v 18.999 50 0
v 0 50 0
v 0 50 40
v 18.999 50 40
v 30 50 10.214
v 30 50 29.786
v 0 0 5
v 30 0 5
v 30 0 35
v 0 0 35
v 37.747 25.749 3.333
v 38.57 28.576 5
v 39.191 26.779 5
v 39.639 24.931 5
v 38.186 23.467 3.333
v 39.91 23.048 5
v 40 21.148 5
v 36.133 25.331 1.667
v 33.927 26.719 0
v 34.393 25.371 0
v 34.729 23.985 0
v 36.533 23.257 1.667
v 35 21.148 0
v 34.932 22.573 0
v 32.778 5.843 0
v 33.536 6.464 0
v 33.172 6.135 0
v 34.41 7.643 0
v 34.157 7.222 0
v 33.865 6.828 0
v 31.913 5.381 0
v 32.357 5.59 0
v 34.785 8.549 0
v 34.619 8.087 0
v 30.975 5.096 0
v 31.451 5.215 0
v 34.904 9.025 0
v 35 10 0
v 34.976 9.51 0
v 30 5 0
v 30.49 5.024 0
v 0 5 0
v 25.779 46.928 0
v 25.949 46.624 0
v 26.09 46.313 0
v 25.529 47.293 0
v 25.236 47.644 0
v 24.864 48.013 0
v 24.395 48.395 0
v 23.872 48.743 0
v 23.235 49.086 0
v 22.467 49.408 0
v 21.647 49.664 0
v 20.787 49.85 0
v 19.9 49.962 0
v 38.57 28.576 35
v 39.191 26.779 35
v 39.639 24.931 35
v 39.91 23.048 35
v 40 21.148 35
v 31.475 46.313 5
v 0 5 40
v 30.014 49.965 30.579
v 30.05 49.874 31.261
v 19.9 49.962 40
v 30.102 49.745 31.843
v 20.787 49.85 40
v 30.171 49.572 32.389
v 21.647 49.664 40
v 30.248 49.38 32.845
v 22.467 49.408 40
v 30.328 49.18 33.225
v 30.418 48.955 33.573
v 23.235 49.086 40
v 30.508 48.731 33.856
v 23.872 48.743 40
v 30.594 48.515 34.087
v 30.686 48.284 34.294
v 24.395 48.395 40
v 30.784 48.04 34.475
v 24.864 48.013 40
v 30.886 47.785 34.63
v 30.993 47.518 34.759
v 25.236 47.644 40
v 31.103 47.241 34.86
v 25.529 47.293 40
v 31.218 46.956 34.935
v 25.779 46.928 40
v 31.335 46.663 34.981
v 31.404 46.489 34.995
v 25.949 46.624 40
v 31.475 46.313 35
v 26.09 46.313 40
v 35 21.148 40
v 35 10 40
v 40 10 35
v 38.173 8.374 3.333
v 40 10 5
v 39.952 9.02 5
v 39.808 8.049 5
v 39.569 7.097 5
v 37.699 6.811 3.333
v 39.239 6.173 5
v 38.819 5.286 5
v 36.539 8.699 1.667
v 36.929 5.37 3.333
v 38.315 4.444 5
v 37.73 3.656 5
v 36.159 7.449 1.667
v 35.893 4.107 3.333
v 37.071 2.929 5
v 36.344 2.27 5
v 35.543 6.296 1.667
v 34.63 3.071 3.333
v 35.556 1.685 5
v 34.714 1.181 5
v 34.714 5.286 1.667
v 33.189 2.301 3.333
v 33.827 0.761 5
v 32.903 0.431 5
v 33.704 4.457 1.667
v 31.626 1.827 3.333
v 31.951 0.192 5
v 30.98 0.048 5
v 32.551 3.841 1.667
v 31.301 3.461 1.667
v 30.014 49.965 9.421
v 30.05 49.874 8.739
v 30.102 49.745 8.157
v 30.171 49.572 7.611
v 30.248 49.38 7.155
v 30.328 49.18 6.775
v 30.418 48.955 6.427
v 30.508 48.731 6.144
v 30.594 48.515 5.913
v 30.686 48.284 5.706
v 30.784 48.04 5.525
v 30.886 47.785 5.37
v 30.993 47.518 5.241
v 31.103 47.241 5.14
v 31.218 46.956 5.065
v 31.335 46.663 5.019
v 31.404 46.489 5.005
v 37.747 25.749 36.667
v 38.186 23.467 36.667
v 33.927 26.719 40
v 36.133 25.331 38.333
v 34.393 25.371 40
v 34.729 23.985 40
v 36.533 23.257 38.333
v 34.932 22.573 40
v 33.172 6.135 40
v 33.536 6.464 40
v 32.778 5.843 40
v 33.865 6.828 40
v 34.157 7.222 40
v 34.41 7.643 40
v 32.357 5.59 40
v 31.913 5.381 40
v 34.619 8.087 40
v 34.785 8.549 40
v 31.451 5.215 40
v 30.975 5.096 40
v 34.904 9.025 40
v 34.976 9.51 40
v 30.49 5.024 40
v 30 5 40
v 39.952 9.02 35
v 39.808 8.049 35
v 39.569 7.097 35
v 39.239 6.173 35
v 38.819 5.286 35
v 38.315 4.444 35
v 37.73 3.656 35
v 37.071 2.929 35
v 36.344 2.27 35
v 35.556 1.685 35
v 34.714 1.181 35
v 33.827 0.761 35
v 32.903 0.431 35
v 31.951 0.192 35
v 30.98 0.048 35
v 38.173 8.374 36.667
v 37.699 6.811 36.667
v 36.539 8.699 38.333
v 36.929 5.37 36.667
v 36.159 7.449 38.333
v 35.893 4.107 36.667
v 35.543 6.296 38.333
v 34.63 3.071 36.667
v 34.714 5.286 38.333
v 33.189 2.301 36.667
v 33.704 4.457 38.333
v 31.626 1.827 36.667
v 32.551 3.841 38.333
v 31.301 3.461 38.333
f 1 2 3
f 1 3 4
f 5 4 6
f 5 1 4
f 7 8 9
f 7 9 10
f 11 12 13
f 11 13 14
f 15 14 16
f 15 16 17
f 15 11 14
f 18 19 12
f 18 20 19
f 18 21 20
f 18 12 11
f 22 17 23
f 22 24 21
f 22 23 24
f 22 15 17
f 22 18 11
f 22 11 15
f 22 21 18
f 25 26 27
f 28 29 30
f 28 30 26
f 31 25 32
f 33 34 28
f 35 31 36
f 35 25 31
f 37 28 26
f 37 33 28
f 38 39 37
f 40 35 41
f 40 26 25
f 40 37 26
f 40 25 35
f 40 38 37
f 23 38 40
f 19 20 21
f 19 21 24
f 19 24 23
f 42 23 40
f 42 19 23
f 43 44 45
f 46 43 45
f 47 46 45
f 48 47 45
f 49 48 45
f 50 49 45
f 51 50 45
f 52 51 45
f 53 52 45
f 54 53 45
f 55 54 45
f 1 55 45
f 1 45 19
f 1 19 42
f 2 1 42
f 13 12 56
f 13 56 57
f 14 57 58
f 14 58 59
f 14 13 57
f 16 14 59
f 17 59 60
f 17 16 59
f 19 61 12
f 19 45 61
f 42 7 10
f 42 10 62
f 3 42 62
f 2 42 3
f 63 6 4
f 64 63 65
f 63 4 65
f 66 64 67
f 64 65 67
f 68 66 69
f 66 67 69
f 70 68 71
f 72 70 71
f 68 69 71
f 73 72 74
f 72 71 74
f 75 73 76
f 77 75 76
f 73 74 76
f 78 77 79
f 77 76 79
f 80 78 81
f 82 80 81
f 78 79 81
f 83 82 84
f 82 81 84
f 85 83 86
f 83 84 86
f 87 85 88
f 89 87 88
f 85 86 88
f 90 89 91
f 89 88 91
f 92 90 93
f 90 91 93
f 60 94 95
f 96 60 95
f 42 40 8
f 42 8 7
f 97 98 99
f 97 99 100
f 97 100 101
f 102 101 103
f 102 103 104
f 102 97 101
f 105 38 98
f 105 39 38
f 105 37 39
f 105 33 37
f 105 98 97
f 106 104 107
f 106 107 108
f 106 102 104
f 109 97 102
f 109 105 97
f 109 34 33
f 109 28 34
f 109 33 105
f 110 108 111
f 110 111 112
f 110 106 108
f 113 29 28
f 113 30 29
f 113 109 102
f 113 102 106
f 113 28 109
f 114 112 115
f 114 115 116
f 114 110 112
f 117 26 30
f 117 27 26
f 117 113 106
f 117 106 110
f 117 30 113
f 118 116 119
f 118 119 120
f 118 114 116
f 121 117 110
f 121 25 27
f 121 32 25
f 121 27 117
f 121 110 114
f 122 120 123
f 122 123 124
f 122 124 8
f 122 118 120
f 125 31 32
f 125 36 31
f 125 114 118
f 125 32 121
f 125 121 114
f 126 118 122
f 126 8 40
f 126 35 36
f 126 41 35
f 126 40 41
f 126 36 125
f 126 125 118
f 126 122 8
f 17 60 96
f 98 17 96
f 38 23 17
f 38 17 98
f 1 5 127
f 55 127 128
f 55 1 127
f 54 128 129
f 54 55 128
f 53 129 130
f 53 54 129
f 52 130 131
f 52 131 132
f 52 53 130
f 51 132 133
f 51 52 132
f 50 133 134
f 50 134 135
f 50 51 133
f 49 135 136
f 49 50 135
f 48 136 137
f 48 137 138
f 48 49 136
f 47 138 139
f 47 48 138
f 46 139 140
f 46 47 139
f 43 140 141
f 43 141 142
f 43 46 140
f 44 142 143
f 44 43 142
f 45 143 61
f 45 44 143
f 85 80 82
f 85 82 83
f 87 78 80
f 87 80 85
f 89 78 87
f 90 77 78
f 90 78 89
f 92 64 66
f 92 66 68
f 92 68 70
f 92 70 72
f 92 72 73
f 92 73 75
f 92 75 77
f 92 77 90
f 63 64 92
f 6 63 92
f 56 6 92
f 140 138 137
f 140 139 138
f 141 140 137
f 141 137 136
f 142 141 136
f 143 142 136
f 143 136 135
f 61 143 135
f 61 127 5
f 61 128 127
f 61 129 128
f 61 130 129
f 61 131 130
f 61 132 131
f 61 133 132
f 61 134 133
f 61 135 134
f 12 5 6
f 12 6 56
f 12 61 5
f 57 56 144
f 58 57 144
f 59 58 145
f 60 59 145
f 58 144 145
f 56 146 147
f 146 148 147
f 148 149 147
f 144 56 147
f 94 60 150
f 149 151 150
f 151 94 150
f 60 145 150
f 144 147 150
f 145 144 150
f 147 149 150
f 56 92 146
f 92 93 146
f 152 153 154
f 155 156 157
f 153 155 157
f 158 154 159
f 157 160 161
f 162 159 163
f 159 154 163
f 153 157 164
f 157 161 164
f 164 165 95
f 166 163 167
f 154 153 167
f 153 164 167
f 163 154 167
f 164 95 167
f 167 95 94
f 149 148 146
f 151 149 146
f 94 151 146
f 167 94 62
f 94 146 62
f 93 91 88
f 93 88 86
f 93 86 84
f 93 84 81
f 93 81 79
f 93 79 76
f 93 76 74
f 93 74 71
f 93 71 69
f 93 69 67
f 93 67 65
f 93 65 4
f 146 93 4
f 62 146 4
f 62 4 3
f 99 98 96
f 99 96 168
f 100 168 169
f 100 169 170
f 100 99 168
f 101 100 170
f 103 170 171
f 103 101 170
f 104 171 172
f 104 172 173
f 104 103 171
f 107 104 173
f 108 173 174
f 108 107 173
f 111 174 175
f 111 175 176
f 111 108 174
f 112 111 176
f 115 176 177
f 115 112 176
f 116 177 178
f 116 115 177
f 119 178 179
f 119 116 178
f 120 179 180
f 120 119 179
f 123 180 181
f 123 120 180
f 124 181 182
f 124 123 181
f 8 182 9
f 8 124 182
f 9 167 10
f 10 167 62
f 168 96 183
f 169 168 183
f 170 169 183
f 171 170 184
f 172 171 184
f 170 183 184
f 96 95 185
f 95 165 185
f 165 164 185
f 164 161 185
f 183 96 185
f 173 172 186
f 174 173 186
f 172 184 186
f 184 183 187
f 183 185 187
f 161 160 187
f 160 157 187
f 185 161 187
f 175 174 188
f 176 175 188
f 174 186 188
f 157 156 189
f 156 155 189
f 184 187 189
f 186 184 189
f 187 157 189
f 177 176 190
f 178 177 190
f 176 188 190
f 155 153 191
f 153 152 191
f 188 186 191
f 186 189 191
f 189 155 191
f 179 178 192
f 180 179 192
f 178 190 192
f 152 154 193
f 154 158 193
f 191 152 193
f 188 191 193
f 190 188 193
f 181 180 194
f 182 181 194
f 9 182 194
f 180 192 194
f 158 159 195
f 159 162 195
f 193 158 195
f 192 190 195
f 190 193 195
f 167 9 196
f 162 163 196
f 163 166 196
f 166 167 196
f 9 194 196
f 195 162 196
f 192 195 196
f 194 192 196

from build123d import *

# Parameters (mm, degrees)
BOSS_EXTRUDE2_DEPTH = 40
CHAMFER2_SIZE       = 5
FILLET2_R           = 5


with BuildPart() as part:
    # Sketch2 → Boss-Extrude2 (new body)
    with BuildSketch(Plane.XY):
        with BuildLine():
            Line((0, 0), (0, 50))
            Line((0, 50), (30, 50))
            Line((30, 50), (38.569533818, 28.576165456))
            ThreePointArc((38.569533818, 28.576165456), (39.639127735, 24.930502352), (40, 21.148351929))
            Line((40, 21.148351929), (40, 10))
            ThreePointArc((40, 10), (37.071067812, 2.928932188), (30, 0))
            Line((30, 0), (0, 0))
        make_face()
    extrude(amount=BOSS_EXTRUDE2_DEPTH)

    # Chamfer2
    chamfer2_edges = [part.edges().sort_by_distance(p)[0] for p in [
        (15, 0, 0),
        (40, 15.574175964, 40),
        (39.639127735, 24.930502352, 40),
        (34.284766909, 39.288082728, 40),
        (15, 0, 40),
        (34.284766909, 39.288082728, 0),
        (39.639127735, 24.930502352, 0),
        (37.071067812, 2.928932188, 40),
        (40, 15.574175964, 0),
        (37.071067812, 2.928932188, 0),
    ]]
    chamfer(chamfer2_edges, length=CHAMFER2_SIZE)

    # Fillet2
    fillet2_edges = [part.edges().sort_by_distance(p)[0] for p in [
        (27.307417596, 50, 37.5),
        (27.307417596, 50, 2.5),
    ]]
    fillet(fillet2_edges, radius=FILLET2_R)


solid = part.part
